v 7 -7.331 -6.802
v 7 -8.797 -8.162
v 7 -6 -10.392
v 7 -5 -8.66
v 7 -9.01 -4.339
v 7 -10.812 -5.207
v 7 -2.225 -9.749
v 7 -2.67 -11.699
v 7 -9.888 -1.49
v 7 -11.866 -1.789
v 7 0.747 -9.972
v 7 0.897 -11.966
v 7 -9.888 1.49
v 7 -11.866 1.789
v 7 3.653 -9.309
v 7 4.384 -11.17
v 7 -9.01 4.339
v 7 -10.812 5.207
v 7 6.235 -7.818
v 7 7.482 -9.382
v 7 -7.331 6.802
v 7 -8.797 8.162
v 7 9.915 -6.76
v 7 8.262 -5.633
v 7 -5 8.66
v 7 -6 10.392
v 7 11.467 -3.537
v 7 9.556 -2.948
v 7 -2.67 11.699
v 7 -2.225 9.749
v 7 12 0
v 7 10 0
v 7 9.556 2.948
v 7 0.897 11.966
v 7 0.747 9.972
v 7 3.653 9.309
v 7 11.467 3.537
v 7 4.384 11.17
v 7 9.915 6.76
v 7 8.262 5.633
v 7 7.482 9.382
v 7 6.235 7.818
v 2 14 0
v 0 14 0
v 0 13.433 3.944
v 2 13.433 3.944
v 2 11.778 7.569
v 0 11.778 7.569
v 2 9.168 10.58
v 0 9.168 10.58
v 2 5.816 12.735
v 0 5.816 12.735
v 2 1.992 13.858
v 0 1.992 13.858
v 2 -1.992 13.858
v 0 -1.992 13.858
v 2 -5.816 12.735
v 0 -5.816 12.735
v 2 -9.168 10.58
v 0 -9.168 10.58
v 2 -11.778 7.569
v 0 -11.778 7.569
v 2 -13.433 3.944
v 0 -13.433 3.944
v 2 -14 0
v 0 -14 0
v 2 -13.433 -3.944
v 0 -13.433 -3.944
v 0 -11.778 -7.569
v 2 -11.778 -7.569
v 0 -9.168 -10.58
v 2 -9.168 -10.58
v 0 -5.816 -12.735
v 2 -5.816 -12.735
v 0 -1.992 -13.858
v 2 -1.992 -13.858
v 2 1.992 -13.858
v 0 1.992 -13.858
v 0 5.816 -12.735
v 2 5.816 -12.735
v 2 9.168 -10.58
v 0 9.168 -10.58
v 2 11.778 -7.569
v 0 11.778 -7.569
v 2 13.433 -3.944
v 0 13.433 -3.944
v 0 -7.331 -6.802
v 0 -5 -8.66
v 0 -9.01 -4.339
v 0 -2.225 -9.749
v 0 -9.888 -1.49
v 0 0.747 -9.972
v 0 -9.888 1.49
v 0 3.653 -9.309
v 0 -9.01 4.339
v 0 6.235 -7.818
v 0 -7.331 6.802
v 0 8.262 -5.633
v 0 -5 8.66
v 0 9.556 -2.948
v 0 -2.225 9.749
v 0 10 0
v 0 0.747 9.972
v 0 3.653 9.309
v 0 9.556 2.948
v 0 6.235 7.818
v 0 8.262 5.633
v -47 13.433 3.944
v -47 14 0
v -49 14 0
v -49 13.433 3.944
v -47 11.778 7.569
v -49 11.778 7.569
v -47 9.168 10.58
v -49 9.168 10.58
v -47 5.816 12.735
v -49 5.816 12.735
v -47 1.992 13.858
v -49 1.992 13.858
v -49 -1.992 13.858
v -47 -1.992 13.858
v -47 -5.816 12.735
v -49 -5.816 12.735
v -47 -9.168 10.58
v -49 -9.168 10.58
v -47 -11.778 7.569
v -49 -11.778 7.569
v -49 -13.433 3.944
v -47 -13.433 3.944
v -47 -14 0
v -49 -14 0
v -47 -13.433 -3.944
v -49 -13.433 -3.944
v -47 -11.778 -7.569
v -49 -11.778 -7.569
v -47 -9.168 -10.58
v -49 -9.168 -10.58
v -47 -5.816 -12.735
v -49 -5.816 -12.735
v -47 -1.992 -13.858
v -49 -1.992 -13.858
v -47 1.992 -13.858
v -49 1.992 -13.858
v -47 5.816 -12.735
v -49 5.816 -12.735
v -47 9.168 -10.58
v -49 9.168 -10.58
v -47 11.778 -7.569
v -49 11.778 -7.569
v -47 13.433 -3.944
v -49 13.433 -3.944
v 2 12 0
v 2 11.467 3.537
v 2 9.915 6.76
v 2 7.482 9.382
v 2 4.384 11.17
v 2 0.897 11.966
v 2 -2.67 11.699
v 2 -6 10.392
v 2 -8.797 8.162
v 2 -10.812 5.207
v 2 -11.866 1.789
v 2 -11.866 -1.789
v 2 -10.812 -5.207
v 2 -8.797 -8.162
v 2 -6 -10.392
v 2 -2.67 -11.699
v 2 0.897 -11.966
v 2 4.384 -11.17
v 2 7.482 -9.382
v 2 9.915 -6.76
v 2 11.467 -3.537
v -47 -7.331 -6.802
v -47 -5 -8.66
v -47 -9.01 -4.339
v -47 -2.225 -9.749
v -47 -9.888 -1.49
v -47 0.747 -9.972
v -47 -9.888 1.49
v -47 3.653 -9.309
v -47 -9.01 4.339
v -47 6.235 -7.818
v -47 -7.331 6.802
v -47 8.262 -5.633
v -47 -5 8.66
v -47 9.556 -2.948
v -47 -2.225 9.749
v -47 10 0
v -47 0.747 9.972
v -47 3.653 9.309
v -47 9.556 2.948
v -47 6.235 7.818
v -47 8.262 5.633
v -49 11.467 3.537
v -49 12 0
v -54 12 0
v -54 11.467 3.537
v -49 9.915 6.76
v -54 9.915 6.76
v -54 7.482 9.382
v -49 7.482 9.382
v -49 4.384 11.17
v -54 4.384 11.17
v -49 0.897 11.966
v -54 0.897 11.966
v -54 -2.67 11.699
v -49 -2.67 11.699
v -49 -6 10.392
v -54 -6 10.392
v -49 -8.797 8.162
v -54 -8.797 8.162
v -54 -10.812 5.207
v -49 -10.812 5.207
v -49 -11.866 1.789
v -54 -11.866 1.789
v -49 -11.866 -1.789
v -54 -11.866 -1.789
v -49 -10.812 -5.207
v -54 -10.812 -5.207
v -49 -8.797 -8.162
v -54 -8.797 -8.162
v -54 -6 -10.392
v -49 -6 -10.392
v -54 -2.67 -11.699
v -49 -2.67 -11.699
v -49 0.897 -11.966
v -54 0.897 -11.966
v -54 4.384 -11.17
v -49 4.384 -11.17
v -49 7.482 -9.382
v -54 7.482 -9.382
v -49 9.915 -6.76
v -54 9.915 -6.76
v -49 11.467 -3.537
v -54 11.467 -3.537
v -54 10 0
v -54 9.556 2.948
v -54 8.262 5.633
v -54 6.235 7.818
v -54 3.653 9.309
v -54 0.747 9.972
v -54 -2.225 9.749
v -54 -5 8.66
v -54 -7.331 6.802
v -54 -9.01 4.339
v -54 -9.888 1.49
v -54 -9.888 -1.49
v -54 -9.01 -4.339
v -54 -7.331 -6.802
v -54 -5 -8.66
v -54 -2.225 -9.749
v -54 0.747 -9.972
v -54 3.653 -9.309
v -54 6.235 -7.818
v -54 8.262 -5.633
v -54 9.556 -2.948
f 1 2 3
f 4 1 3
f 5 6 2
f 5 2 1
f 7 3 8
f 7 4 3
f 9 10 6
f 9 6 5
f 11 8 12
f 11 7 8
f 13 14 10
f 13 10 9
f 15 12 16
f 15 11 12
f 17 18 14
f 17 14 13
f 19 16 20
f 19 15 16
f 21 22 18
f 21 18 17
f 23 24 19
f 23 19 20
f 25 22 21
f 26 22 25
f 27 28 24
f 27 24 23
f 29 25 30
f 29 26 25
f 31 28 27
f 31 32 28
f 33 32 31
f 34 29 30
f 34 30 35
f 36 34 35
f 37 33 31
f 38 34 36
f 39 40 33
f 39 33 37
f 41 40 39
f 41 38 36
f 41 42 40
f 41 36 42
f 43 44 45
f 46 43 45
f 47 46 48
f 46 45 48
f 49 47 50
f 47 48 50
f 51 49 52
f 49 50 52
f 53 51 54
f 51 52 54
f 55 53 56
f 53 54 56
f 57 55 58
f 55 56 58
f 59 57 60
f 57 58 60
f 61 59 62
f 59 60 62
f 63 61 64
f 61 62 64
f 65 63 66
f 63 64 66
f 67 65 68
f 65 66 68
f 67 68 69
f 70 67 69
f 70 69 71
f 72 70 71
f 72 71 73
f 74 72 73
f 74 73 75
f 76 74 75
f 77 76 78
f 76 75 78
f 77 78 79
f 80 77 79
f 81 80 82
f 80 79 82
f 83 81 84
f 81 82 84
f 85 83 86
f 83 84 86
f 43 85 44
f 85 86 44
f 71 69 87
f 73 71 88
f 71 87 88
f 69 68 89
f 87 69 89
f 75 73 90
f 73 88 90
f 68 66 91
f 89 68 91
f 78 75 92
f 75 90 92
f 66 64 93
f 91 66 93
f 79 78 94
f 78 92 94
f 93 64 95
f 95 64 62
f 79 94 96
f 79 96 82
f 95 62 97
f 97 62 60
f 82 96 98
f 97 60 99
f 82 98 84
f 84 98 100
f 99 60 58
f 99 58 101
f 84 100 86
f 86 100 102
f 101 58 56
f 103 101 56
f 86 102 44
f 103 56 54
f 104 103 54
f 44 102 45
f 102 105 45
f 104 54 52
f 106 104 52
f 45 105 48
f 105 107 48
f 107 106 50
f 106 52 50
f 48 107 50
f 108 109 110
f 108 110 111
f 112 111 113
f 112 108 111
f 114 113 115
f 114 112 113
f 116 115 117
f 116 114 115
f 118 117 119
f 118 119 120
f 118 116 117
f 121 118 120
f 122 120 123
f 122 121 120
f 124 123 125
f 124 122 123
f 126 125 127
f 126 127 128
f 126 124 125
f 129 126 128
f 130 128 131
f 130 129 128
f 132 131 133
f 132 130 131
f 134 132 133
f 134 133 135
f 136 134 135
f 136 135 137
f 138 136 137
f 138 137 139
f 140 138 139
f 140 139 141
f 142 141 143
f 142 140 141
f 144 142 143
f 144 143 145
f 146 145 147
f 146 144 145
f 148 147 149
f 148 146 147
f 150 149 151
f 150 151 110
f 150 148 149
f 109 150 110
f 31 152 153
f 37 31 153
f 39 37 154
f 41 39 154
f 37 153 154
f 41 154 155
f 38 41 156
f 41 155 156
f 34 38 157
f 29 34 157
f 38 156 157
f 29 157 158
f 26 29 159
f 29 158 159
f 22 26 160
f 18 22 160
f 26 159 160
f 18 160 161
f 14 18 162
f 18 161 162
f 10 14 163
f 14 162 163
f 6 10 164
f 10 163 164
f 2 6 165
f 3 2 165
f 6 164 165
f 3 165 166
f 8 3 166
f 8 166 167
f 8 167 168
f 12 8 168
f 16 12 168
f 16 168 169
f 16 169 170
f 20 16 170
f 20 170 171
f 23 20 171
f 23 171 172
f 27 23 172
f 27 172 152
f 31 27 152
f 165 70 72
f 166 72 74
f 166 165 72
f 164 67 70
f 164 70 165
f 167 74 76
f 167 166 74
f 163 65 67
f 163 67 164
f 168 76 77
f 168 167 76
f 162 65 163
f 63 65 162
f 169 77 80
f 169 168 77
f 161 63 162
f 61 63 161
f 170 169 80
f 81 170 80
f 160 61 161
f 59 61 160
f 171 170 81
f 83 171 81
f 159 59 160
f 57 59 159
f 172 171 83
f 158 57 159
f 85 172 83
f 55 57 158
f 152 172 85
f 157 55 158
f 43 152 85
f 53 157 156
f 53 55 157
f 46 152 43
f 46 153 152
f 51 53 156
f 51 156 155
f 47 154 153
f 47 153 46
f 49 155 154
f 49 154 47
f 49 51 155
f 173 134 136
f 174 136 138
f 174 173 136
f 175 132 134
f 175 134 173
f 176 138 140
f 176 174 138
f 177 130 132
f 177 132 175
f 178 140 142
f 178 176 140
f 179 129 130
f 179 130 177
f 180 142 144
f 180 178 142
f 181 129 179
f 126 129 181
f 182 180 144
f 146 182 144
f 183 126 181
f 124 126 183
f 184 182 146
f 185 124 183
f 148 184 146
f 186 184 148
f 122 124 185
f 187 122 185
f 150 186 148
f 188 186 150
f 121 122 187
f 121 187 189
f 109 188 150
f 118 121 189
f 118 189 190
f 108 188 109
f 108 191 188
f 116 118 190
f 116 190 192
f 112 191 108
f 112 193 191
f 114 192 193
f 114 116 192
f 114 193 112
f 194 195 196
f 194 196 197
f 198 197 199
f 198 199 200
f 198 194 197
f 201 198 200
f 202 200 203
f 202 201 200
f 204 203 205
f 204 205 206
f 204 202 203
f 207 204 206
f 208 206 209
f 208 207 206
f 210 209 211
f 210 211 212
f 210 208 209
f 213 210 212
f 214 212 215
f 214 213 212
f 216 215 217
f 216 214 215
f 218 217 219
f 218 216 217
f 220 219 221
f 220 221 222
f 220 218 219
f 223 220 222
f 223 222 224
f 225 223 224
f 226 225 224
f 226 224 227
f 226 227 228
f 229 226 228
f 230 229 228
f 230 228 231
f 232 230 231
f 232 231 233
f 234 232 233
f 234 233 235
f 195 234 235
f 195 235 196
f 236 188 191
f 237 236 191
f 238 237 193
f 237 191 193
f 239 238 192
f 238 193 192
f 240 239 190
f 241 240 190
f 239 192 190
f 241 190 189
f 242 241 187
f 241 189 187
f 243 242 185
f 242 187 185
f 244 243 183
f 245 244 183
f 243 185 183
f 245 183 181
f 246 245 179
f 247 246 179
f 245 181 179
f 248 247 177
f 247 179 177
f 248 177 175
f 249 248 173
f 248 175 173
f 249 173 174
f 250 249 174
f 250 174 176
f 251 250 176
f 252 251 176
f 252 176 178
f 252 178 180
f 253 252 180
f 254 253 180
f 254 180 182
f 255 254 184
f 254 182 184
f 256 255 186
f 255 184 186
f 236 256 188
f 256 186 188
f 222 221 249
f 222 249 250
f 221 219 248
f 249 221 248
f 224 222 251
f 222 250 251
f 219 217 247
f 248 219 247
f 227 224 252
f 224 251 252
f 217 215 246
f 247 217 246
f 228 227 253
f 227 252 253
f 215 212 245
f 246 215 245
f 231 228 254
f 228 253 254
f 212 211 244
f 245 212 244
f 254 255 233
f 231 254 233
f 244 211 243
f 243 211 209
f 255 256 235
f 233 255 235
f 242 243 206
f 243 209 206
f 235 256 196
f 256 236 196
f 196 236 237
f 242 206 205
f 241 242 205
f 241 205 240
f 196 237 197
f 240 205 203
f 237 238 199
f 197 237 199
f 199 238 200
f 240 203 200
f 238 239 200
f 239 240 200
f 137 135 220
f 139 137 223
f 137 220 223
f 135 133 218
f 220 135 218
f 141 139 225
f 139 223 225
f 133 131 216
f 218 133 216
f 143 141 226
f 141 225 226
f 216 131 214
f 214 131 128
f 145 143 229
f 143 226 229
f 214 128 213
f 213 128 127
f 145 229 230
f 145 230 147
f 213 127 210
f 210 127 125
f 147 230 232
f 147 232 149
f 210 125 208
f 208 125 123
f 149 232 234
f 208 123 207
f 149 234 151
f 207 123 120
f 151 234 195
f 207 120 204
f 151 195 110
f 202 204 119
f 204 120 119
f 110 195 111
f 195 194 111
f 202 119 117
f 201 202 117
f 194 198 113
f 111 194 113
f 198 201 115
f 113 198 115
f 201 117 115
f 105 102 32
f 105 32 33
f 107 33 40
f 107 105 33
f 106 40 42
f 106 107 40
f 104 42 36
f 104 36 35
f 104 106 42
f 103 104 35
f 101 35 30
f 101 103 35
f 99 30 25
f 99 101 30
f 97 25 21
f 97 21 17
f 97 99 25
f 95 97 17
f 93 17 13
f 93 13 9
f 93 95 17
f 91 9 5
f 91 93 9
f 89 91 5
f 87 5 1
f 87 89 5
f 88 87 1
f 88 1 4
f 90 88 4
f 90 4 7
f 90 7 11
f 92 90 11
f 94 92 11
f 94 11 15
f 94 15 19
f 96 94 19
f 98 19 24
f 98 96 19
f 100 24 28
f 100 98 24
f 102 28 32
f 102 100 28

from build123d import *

# Parameters (mm, degrees)
F0_R     = 12
F0_R_2   = 10
F1_DEPTH = 7
F0_R_3   = 14
F2_DEPTH = 2


with BuildPart() as f1:
    # F0 (on Right) → F1 (new body)
    with BuildSketch(Plane.YZ):
        Circle(F0_R)
        Circle(F0_R_2, mode=Mode.SUBTRACT)
    extrude(amount=F1_DEPTH)

    # F0 (on Right) → F2 (join)
    with BuildSketch(Plane.YZ):
        Circle(F0_R_3)
        Circle(F0_R, mode=Mode.SUBTRACT)
    extrude(amount=F2_DEPTH)


with BuildPart() as f4_1:
    # F4: instance of F1
    add(f1.part.mirror(Plane.YZ.offset(-23.5)))


solid = Compound([f1.part, f4_1.part])
